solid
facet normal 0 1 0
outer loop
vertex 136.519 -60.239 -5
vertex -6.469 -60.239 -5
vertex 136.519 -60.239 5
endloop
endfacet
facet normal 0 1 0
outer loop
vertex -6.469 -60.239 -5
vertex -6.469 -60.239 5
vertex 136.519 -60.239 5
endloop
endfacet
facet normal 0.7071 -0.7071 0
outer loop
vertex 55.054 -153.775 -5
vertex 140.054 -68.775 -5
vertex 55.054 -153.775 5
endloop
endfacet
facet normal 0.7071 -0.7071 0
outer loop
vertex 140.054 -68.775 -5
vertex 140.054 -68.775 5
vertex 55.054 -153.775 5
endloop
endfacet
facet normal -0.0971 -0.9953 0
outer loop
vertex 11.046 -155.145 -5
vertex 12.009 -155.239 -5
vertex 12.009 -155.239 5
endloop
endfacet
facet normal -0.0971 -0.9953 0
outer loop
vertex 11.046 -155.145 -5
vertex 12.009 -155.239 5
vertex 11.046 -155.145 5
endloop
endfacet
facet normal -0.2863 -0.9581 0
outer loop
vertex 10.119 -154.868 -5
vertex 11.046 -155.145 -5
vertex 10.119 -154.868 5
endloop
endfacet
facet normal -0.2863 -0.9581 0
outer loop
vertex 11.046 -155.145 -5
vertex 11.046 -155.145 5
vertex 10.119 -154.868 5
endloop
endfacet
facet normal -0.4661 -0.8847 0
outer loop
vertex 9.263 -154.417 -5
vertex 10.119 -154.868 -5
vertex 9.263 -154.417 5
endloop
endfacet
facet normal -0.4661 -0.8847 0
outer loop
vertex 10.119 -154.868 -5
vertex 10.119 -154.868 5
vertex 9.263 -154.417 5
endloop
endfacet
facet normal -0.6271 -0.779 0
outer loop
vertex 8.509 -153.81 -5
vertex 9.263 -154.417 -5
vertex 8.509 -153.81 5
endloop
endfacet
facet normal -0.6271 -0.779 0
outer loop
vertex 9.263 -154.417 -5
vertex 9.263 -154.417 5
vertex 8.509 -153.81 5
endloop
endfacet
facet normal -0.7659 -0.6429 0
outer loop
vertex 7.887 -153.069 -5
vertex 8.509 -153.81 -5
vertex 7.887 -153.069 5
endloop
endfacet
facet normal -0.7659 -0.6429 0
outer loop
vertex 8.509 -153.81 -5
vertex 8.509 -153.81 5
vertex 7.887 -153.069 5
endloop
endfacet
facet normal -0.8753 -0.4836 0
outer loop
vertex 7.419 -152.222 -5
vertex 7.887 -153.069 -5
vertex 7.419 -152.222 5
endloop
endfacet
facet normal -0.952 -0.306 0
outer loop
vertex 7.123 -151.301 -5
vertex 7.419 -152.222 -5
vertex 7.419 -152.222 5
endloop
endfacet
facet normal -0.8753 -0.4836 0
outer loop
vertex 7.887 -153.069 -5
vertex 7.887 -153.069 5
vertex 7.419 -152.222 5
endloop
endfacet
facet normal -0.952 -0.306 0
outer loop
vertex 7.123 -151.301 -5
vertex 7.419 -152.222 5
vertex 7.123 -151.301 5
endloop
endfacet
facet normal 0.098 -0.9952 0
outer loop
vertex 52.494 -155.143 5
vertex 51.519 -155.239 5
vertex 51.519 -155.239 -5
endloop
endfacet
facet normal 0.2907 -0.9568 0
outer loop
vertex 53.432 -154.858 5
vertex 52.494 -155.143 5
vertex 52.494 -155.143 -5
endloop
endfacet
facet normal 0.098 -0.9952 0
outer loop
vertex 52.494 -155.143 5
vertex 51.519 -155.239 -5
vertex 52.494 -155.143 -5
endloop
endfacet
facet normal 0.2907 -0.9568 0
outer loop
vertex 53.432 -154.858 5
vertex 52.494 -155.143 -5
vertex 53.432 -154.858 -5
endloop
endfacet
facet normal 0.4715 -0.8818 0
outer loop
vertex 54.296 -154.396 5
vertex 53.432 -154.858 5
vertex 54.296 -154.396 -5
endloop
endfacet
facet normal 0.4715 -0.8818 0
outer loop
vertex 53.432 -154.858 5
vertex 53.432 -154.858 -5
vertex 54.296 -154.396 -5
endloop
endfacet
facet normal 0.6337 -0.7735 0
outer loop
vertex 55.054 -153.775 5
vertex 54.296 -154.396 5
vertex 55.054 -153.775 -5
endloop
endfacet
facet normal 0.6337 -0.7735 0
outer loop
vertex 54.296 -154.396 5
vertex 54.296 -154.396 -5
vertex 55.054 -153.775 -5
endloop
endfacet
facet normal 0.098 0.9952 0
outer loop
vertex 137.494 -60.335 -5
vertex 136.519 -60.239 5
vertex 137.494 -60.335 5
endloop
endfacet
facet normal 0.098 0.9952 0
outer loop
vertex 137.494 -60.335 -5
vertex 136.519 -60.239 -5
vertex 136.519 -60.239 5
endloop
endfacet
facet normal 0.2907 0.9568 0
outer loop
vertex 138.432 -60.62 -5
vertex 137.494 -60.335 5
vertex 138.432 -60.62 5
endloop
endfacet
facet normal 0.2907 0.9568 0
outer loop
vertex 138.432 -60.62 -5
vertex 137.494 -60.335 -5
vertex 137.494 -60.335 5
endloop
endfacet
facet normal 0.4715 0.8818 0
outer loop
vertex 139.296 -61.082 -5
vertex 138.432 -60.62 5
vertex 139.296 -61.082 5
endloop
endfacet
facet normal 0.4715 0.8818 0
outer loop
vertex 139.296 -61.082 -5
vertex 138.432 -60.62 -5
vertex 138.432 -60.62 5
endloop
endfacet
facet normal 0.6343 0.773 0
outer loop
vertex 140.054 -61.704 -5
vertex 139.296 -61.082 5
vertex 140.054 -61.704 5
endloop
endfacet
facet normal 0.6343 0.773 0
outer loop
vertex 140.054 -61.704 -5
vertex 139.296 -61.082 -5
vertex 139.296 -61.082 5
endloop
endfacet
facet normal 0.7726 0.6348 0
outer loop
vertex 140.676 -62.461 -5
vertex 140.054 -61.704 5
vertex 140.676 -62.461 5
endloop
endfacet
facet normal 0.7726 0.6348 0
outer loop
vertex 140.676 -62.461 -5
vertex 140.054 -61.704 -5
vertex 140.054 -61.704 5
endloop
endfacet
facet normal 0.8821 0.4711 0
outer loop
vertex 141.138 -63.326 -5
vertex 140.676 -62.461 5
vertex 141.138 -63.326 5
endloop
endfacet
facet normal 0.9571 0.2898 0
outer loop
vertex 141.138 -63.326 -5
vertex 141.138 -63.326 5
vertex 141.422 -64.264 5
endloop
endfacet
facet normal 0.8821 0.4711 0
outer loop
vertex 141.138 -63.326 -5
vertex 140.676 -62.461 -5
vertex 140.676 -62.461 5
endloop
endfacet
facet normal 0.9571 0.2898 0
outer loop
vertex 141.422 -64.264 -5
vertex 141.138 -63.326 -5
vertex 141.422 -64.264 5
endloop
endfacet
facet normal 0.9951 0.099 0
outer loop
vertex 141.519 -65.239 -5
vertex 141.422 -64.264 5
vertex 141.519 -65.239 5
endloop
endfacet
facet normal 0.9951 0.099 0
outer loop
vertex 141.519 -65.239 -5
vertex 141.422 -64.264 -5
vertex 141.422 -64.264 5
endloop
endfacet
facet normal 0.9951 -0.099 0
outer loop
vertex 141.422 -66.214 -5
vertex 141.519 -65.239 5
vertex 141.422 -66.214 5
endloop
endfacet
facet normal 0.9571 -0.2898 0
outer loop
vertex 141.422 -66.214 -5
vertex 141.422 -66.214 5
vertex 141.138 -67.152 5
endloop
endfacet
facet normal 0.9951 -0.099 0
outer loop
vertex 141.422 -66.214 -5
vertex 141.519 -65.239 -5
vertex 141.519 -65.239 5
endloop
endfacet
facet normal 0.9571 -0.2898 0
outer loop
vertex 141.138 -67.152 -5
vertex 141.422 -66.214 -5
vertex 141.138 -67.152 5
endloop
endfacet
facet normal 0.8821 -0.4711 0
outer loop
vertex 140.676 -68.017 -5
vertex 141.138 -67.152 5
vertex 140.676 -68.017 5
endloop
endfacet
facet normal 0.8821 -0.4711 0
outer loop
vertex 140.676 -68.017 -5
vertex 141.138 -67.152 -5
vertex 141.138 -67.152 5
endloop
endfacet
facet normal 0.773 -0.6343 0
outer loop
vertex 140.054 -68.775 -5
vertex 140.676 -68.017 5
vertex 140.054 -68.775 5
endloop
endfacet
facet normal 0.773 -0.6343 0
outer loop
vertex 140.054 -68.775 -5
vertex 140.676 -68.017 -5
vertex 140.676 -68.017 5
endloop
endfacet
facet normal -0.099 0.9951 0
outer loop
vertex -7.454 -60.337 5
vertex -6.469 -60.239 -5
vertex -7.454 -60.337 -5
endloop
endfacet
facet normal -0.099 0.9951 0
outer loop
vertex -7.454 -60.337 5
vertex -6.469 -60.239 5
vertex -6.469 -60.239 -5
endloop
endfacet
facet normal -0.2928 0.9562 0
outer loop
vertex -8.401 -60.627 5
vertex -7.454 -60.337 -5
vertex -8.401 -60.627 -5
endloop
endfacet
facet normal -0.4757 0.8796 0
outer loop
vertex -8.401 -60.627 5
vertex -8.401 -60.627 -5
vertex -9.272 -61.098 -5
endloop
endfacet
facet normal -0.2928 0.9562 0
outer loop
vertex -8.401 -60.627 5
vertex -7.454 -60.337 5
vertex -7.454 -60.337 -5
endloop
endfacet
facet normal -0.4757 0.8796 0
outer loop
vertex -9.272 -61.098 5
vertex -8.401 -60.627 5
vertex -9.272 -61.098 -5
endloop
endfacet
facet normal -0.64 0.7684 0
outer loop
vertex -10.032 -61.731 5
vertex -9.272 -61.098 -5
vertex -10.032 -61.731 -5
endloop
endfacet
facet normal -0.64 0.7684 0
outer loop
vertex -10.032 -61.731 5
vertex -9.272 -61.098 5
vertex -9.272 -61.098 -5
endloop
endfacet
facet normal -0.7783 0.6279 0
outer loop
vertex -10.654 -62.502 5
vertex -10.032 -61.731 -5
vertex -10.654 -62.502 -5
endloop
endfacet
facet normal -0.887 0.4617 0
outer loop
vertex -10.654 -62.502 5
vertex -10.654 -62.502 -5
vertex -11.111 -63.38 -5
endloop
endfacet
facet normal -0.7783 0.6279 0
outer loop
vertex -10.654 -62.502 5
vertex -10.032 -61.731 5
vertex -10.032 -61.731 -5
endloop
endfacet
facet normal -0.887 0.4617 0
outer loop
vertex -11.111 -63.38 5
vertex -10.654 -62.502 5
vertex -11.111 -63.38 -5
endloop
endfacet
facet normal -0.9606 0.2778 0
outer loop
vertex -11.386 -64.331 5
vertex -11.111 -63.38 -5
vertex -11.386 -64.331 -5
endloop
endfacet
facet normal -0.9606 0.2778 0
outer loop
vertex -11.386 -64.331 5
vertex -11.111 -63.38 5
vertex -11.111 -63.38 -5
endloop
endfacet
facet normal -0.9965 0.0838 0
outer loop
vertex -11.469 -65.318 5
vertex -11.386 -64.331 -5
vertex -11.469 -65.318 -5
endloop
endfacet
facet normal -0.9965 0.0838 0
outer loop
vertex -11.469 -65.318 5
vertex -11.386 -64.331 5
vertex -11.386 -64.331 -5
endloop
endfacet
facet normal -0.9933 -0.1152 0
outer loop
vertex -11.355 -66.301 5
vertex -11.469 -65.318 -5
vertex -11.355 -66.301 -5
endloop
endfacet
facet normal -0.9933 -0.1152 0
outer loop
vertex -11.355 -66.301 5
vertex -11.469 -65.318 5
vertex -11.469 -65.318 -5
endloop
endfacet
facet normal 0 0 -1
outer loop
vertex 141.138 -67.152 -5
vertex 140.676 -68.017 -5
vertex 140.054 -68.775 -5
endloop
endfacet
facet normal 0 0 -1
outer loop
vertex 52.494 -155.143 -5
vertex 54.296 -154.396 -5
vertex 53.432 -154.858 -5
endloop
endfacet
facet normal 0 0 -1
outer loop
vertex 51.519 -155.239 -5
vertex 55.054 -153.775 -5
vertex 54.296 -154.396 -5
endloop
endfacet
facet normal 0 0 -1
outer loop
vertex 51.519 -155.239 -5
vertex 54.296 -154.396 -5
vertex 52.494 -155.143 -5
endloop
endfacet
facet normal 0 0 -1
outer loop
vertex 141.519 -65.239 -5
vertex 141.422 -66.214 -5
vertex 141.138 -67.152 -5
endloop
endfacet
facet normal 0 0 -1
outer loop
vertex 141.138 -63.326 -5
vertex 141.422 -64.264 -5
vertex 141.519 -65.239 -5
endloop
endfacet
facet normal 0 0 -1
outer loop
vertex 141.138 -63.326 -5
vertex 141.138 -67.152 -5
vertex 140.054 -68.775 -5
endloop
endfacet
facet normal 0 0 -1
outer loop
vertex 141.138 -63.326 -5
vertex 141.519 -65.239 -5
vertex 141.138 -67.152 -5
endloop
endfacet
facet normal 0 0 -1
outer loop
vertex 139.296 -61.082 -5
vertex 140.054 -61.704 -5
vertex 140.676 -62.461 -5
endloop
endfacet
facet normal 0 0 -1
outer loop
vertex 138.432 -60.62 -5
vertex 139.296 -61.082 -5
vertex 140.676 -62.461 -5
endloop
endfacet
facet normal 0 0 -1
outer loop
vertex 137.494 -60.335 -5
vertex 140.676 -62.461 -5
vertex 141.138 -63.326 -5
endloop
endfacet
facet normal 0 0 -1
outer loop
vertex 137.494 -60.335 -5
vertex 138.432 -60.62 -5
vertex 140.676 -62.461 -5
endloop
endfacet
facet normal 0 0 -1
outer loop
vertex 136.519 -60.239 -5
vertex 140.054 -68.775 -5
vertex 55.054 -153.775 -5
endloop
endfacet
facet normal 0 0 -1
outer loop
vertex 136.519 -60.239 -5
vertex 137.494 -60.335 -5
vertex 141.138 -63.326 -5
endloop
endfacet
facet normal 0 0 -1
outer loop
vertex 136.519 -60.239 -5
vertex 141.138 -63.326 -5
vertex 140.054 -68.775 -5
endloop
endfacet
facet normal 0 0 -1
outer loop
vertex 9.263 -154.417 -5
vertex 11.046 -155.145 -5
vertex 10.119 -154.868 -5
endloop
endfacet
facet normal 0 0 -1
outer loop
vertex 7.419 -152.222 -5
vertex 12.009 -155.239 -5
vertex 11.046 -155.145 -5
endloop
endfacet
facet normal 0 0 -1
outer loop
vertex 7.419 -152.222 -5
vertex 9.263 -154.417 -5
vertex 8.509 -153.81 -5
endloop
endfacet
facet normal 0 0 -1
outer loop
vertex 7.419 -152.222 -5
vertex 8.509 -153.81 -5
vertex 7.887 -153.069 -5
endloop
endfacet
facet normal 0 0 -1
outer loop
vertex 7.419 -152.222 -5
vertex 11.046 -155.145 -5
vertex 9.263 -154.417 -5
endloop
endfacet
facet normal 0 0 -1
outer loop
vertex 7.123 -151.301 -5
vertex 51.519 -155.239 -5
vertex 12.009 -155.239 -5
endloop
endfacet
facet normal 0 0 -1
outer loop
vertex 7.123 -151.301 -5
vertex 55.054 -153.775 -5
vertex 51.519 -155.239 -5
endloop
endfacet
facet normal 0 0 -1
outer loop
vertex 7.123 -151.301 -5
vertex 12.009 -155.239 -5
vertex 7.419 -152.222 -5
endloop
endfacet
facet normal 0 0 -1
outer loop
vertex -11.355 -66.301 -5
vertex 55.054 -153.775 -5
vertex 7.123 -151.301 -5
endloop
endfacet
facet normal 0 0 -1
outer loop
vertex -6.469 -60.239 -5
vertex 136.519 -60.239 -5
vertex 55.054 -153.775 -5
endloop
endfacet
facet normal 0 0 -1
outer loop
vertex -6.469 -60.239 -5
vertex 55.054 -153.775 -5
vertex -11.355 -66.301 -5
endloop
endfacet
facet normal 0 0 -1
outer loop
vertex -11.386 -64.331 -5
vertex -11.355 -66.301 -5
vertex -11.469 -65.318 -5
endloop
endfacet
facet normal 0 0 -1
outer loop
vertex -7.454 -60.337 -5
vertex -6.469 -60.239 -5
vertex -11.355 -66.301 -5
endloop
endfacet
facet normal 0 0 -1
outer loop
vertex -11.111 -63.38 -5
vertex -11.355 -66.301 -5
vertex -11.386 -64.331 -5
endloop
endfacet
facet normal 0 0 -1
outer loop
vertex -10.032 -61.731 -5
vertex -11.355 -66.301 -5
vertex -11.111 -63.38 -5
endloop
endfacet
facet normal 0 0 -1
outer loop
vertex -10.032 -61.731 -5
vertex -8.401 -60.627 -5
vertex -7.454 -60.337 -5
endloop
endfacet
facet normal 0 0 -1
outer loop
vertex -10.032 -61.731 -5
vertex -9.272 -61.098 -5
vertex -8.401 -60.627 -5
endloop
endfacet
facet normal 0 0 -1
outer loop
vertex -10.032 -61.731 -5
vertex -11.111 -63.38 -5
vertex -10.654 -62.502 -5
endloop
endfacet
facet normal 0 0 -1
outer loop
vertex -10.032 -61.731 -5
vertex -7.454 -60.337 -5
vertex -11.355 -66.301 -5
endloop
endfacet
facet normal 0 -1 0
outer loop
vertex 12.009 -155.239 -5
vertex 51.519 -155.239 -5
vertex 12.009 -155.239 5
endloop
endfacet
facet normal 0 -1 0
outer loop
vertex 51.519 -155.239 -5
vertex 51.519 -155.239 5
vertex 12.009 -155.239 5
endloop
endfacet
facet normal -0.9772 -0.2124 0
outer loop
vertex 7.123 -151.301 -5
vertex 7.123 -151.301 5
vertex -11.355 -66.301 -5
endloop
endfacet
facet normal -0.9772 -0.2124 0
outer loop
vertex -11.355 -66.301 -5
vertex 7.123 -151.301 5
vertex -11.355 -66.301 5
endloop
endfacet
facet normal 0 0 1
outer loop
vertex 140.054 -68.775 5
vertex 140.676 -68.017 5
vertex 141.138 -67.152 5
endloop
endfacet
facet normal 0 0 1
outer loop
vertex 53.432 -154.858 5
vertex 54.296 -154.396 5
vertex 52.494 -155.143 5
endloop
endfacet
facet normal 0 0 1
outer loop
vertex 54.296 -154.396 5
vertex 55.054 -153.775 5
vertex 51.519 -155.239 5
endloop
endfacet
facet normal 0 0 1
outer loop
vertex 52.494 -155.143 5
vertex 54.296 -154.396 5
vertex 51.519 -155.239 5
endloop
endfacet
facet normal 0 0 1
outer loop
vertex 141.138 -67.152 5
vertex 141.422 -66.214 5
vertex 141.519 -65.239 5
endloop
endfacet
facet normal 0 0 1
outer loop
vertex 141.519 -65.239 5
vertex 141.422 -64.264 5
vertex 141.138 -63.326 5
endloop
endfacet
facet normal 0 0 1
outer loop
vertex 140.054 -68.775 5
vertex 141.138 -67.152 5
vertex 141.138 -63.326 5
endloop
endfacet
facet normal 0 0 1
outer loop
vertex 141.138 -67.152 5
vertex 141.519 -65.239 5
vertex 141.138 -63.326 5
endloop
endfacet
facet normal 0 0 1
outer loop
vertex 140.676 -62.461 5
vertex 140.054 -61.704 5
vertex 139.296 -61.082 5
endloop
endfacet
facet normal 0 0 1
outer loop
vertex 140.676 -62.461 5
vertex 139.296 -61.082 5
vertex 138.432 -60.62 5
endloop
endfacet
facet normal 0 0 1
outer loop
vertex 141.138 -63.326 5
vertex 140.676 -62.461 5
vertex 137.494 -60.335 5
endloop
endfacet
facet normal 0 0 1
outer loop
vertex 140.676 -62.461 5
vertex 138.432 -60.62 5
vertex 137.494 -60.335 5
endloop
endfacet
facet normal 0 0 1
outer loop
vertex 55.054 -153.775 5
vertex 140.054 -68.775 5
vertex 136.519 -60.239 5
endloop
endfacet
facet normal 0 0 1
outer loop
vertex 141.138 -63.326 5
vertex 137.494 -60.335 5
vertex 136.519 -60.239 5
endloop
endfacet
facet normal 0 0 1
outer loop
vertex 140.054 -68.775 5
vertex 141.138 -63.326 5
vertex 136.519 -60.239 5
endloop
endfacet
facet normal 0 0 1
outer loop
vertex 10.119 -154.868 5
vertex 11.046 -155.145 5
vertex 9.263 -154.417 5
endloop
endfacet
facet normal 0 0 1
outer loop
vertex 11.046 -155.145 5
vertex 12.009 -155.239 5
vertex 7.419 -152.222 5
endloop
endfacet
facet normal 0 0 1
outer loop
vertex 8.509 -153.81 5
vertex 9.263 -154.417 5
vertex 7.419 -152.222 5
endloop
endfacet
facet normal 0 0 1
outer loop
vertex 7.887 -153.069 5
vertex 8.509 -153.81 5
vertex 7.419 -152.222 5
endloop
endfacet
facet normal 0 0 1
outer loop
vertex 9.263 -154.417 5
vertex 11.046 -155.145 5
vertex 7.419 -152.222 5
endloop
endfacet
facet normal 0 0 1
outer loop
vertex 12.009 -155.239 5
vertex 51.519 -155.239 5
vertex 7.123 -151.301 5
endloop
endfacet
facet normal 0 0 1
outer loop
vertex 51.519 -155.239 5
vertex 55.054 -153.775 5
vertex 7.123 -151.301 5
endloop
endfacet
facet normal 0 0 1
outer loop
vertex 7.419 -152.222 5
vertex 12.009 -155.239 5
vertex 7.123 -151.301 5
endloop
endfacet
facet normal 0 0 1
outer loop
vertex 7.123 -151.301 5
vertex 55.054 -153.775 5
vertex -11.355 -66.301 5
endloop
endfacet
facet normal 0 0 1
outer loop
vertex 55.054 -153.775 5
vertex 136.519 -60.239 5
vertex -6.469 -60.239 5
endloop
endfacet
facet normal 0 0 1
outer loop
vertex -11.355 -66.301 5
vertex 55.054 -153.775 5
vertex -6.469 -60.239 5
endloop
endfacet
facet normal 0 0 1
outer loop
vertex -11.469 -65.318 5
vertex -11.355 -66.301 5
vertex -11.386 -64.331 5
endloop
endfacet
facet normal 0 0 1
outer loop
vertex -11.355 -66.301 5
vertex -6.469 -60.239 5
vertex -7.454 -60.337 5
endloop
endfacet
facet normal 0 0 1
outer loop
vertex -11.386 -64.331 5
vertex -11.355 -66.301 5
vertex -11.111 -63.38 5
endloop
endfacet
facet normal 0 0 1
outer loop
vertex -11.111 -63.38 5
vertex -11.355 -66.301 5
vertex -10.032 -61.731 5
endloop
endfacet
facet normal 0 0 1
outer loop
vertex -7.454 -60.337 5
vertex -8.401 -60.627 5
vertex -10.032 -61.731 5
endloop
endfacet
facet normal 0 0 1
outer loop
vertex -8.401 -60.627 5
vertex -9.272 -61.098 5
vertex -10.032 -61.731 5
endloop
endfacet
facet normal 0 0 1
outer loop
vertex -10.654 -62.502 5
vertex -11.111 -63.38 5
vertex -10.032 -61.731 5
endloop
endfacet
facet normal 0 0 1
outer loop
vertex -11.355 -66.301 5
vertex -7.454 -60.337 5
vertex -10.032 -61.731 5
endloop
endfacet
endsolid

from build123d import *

# Parameters (mm, degrees)
BOSS_EXTRUDE1_DEPTH = 5
FILLET1_R           = 5


with BuildPart() as part:
    # Sketch1 → Boss-Extrude1 (new, symmetric)
    with BuildSketch(Plane.XY):
        Polygon((-12.672945593, -60.23903484), (148.589587107, -60.23903484), (53.589587107, -155.23903484), (7.97922832, -155.23903484), align=None)
    extrude(amount=BOSS_EXTRUDE1_DEPTH, both=True)

    # Fillet1
    fillet1_edges = [part.edges().sort_by_distance(p)[0] for p in [
        (-12.672945593, -60.23903484, 0),
        (148.589587107, -60.23903484, 0),
        (53.589587107, -155.23903484, 0),
        (7.97922832, -155.23903484, 0),
    ]]
    fillet(fillet1_edges, radius=FILLET1_R)


solid = part.part
